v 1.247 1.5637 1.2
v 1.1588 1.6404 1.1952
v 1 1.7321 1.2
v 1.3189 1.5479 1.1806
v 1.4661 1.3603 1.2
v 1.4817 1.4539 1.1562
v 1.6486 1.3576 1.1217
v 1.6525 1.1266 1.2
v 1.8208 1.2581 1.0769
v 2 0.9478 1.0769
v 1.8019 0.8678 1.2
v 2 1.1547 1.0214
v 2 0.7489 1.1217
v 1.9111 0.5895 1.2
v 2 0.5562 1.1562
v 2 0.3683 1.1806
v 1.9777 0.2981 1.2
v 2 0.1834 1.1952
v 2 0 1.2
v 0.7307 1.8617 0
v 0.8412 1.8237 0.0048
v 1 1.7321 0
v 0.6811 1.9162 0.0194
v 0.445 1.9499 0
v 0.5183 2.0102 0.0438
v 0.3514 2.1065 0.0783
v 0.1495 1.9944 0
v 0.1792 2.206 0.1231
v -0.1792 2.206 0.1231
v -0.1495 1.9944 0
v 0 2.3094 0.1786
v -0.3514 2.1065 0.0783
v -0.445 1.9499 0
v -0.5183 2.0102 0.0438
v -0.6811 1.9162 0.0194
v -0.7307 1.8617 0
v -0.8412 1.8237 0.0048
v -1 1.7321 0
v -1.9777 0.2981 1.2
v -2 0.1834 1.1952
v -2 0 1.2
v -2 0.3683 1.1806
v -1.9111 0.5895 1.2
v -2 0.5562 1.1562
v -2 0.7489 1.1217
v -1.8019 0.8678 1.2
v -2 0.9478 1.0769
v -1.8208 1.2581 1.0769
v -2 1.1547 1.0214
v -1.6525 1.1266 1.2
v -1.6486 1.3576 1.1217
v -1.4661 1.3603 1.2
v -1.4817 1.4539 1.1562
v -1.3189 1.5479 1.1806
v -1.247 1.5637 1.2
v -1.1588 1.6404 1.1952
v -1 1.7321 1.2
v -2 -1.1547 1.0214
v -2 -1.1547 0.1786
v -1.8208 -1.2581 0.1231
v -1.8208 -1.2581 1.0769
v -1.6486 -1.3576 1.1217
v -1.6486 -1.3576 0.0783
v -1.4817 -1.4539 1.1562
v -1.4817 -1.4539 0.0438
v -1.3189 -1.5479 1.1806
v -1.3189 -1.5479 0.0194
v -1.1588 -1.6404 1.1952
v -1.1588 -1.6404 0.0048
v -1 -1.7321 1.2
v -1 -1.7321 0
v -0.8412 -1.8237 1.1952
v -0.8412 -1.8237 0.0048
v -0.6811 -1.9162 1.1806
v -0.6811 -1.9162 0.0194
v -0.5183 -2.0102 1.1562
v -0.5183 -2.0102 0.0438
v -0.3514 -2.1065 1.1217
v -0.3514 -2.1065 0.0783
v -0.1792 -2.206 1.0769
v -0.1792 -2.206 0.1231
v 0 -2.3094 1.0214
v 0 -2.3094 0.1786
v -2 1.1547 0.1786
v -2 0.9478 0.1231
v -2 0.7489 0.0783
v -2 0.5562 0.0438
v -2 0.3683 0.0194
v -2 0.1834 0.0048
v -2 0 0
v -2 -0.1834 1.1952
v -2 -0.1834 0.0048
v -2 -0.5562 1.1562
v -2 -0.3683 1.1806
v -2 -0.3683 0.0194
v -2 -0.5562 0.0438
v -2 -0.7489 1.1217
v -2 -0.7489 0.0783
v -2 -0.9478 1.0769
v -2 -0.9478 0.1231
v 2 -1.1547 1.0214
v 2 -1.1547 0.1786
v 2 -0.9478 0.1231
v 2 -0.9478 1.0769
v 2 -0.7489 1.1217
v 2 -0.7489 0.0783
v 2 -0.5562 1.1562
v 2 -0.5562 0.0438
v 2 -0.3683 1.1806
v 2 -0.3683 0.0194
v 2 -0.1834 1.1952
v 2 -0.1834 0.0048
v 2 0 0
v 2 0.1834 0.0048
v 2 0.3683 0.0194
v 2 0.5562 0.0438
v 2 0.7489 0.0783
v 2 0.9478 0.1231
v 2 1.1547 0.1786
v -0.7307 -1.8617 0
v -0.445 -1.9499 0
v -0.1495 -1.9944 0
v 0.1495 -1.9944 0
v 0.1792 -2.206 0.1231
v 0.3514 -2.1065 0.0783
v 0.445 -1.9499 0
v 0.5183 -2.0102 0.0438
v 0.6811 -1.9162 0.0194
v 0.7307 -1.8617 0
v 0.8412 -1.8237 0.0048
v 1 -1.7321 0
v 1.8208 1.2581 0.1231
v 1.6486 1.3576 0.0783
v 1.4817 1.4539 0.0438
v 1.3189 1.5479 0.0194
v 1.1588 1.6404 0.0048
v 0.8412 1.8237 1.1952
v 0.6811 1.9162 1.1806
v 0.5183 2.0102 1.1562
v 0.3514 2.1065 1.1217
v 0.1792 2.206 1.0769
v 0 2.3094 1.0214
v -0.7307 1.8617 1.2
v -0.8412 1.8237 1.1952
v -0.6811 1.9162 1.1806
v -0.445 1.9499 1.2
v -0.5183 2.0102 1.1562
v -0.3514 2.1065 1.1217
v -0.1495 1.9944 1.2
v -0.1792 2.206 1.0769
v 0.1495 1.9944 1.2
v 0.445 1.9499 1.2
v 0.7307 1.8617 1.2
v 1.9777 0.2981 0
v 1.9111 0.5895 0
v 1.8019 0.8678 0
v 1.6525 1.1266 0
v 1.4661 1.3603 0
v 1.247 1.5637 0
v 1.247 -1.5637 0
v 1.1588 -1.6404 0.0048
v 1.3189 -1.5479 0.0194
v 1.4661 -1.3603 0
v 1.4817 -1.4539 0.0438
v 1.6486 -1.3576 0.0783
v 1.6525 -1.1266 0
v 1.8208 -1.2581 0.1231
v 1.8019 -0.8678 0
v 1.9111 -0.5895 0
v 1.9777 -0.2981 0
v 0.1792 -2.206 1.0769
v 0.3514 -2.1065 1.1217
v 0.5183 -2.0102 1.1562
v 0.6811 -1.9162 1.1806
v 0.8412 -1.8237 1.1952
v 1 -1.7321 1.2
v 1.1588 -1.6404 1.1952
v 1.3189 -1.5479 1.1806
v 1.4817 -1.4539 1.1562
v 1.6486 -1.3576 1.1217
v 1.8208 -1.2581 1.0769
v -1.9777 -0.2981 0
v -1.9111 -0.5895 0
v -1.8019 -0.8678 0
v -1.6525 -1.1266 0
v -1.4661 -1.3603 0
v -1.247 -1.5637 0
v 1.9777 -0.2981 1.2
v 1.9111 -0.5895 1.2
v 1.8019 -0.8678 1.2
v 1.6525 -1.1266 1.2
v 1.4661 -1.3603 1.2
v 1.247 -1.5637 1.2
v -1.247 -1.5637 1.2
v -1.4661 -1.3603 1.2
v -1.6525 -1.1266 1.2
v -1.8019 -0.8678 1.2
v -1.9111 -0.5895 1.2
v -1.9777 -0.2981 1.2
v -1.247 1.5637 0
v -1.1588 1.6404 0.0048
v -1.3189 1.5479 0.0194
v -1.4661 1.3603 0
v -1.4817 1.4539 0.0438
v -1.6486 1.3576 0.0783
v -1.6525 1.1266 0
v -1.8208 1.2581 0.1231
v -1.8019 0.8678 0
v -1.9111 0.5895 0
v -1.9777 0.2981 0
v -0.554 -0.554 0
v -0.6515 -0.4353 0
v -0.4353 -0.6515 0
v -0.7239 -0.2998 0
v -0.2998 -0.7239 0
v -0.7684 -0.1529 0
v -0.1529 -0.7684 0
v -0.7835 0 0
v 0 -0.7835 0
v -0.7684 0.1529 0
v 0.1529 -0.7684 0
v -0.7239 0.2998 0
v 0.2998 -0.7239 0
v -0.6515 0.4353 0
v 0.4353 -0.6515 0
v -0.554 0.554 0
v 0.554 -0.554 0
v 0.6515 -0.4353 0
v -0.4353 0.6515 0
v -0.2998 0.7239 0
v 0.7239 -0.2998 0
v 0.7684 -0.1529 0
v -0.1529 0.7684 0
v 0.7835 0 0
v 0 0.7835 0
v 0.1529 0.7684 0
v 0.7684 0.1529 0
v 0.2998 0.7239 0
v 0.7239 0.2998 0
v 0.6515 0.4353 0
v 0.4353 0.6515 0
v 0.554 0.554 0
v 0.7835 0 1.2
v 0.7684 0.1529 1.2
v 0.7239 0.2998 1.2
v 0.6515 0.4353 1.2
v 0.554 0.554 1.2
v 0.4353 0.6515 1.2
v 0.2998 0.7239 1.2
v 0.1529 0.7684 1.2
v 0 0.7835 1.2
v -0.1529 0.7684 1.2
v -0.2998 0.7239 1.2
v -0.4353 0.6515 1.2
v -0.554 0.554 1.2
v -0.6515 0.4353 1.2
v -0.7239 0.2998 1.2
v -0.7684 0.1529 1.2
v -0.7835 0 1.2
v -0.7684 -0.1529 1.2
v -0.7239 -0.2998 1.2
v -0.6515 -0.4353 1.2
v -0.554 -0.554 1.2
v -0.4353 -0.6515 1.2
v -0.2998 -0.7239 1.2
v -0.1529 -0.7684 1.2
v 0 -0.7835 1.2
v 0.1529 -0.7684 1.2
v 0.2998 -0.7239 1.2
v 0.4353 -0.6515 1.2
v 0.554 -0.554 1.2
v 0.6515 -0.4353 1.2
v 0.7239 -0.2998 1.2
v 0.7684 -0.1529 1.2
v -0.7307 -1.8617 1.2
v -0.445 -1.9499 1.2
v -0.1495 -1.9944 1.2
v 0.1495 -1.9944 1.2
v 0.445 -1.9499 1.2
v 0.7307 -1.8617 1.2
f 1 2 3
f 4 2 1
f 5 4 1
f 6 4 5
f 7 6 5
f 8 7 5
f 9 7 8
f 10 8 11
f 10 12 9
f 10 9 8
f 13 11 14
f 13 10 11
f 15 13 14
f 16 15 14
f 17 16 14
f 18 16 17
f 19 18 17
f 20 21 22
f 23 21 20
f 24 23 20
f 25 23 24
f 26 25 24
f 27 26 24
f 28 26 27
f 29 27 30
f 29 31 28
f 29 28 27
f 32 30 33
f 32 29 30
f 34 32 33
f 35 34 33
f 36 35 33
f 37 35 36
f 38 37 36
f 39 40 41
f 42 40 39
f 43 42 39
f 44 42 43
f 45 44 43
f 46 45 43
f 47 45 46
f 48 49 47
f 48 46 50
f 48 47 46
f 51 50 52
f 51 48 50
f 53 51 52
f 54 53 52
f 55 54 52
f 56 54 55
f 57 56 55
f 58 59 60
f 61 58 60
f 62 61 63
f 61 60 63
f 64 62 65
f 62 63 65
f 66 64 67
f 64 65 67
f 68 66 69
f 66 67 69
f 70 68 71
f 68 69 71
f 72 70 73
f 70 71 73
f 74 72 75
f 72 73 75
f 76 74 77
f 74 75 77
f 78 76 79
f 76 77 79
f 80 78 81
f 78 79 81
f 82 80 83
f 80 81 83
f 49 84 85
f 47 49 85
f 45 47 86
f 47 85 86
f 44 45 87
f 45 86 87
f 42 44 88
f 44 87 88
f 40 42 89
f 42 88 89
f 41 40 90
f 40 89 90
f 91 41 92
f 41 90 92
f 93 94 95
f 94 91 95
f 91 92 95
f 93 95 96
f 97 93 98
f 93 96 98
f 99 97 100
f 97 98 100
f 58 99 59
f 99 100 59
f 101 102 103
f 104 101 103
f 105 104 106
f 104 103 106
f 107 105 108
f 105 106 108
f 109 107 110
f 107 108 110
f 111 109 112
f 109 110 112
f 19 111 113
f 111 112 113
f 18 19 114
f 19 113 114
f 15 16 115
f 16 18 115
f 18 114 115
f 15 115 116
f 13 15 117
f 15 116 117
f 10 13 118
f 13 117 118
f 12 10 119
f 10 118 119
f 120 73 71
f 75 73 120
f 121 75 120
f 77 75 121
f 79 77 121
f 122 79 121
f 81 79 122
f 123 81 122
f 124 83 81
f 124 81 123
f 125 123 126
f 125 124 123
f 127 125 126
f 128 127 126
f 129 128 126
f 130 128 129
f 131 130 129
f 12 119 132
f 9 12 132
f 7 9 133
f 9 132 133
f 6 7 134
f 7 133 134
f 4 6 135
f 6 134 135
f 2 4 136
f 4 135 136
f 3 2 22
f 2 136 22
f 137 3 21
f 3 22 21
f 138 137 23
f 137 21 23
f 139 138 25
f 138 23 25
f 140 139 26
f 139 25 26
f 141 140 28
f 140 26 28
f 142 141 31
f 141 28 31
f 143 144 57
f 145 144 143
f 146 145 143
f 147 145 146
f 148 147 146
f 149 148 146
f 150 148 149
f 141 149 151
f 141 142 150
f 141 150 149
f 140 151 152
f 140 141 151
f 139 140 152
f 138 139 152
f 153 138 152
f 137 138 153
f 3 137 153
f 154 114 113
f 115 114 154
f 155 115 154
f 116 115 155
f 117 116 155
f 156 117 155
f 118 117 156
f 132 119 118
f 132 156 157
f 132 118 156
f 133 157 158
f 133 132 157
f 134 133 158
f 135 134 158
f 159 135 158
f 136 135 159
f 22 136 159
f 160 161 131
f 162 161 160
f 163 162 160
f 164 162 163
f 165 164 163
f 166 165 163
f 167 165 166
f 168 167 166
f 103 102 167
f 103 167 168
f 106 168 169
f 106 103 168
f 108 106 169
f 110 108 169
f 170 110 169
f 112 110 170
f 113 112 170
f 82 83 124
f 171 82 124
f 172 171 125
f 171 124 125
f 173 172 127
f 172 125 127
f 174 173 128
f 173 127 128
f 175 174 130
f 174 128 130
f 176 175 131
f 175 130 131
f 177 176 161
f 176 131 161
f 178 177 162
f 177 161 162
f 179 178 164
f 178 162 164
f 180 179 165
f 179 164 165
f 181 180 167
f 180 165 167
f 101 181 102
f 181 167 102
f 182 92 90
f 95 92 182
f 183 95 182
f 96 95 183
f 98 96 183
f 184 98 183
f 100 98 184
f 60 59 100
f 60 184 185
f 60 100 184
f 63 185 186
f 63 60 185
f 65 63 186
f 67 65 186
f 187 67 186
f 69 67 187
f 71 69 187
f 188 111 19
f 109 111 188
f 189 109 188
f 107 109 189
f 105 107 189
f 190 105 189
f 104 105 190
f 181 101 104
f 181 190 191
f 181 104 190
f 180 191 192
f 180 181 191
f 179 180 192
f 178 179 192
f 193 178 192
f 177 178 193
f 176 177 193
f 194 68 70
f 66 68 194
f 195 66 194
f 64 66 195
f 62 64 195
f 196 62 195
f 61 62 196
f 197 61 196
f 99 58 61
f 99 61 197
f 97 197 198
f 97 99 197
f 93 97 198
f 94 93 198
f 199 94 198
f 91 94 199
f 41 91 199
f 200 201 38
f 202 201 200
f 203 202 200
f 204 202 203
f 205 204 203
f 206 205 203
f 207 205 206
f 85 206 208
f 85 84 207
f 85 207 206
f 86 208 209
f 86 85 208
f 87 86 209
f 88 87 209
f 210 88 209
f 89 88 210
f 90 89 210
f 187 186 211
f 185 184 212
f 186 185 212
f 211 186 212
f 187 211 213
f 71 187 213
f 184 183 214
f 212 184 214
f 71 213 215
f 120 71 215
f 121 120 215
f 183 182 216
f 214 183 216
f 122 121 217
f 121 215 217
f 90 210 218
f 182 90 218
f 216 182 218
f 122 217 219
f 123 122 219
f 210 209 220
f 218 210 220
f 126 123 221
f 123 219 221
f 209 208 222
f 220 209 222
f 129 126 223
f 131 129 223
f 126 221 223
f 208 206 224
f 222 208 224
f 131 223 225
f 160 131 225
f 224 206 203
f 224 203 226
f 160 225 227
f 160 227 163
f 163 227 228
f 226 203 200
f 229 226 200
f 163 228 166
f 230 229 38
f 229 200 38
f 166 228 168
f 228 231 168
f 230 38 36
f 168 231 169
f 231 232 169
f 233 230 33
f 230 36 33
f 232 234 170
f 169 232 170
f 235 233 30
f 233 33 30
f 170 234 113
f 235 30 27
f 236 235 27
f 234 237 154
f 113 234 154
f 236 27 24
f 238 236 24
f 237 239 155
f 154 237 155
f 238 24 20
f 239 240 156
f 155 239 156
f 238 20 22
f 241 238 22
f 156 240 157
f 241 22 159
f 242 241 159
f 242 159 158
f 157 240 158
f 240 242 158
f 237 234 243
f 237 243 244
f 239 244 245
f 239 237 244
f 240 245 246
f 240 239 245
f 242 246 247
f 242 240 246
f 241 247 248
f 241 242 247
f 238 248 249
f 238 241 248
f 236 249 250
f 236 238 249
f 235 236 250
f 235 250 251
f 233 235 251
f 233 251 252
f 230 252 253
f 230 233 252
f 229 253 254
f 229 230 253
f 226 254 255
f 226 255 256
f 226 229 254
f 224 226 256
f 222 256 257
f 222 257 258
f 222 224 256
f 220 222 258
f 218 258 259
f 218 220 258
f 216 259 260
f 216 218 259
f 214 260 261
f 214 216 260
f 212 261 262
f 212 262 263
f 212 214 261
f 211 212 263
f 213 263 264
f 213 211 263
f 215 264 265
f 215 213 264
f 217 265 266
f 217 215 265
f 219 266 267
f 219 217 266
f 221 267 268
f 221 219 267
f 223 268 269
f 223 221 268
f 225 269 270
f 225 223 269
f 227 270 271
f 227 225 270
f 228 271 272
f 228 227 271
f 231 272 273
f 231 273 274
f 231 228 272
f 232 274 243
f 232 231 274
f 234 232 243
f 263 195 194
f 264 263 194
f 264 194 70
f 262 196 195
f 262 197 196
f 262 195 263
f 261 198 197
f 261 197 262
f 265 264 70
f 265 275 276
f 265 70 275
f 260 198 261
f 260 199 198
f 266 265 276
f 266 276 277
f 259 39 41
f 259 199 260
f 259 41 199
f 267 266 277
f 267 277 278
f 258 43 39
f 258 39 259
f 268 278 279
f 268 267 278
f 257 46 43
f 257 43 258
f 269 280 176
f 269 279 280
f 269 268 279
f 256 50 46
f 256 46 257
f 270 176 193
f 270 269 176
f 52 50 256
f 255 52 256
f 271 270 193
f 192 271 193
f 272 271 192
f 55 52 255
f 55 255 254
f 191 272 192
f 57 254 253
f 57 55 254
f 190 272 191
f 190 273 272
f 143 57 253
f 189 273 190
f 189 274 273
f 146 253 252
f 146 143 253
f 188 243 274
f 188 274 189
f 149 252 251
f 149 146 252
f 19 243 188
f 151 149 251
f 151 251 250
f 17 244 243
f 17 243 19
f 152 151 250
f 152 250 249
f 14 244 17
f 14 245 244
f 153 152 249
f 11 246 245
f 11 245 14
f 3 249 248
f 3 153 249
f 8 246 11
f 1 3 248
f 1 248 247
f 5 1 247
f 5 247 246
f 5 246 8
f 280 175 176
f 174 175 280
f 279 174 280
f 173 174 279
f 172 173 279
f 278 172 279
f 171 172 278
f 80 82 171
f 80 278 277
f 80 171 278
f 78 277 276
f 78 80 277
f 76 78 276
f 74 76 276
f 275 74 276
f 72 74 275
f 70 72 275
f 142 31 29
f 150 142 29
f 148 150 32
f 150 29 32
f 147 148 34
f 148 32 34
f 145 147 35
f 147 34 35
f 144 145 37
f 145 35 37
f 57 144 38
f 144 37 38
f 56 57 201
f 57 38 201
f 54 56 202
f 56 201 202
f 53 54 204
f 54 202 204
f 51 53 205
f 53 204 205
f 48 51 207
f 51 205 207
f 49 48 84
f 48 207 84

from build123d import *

# Parameters (mm, degrees)
SKETCH_1_R          = 0.7835
EXTRUDE_581_DEPTH   = 1.2
SKETCH_2_OUTSIDE_W  = 14.866
SKETCH_2_OUTSIDE_H  = 15.484
SKETCH_2_OUTSIDE_R  = 2
CUT_EXTRUDE_1_DEPTH = 2.2
CUT_EXTRUDE_1_TAPER = 60
SKETCH_3_OUTSIDE_W  = 14.866
SKETCH_3_OUTSIDE_H  = 15.484
SKETCH_3_OUTSIDE_R  = 2
CUT_EXTRUDE_2_DEPTH = 2.2
CUT_EXTRUDE_2_TAPER = 60


with BuildPart() as part:
    # 草图1 → Extrude 581 (new body)
    with BuildSketch(Plane.XY):
        Polygon((0, 2.309401077), (-2, 1.154700538), (-2, -1.154700538), (0, -2.309401077), (2, -1.154700538), (2, 1.154700538), align=None)
        Circle(SKETCH_1_R, mode=Mode.SUBTRACT)
    extrude(amount=EXTRUDE_581_DEPTH)

    # 草图2 outside → 切除-拉伸1 (cut, through all)
    with BuildSketch(Plane(origin=(0, 0, 0), x_dir=(-1, 0, 0), z_dir=(0, 0, -1))):
        Rectangle(SKETCH_2_OUTSIDE_W, SKETCH_2_OUTSIDE_H)
        Circle(SKETCH_2_OUTSIDE_R, mode=Mode.SUBTRACT)
    extrude(amount=-CUT_EXTRUDE_1_DEPTH, taper=CUT_EXTRUDE_1_TAPER, mode=Mode.SUBTRACT)

    # 草图3 outside → 切除-拉伸2 (cut, through all)
    with BuildSketch(Plane.XY.offset(1.2)):
        Rectangle(SKETCH_3_OUTSIDE_W, SKETCH_3_OUTSIDE_H)
        Circle(SKETCH_3_OUTSIDE_R, mode=Mode.SUBTRACT)
    extrude(amount=-CUT_EXTRUDE_2_DEPTH, taper=CUT_EXTRUDE_2_TAPER, mode=Mode.SUBTRACT)


solid = part.part
